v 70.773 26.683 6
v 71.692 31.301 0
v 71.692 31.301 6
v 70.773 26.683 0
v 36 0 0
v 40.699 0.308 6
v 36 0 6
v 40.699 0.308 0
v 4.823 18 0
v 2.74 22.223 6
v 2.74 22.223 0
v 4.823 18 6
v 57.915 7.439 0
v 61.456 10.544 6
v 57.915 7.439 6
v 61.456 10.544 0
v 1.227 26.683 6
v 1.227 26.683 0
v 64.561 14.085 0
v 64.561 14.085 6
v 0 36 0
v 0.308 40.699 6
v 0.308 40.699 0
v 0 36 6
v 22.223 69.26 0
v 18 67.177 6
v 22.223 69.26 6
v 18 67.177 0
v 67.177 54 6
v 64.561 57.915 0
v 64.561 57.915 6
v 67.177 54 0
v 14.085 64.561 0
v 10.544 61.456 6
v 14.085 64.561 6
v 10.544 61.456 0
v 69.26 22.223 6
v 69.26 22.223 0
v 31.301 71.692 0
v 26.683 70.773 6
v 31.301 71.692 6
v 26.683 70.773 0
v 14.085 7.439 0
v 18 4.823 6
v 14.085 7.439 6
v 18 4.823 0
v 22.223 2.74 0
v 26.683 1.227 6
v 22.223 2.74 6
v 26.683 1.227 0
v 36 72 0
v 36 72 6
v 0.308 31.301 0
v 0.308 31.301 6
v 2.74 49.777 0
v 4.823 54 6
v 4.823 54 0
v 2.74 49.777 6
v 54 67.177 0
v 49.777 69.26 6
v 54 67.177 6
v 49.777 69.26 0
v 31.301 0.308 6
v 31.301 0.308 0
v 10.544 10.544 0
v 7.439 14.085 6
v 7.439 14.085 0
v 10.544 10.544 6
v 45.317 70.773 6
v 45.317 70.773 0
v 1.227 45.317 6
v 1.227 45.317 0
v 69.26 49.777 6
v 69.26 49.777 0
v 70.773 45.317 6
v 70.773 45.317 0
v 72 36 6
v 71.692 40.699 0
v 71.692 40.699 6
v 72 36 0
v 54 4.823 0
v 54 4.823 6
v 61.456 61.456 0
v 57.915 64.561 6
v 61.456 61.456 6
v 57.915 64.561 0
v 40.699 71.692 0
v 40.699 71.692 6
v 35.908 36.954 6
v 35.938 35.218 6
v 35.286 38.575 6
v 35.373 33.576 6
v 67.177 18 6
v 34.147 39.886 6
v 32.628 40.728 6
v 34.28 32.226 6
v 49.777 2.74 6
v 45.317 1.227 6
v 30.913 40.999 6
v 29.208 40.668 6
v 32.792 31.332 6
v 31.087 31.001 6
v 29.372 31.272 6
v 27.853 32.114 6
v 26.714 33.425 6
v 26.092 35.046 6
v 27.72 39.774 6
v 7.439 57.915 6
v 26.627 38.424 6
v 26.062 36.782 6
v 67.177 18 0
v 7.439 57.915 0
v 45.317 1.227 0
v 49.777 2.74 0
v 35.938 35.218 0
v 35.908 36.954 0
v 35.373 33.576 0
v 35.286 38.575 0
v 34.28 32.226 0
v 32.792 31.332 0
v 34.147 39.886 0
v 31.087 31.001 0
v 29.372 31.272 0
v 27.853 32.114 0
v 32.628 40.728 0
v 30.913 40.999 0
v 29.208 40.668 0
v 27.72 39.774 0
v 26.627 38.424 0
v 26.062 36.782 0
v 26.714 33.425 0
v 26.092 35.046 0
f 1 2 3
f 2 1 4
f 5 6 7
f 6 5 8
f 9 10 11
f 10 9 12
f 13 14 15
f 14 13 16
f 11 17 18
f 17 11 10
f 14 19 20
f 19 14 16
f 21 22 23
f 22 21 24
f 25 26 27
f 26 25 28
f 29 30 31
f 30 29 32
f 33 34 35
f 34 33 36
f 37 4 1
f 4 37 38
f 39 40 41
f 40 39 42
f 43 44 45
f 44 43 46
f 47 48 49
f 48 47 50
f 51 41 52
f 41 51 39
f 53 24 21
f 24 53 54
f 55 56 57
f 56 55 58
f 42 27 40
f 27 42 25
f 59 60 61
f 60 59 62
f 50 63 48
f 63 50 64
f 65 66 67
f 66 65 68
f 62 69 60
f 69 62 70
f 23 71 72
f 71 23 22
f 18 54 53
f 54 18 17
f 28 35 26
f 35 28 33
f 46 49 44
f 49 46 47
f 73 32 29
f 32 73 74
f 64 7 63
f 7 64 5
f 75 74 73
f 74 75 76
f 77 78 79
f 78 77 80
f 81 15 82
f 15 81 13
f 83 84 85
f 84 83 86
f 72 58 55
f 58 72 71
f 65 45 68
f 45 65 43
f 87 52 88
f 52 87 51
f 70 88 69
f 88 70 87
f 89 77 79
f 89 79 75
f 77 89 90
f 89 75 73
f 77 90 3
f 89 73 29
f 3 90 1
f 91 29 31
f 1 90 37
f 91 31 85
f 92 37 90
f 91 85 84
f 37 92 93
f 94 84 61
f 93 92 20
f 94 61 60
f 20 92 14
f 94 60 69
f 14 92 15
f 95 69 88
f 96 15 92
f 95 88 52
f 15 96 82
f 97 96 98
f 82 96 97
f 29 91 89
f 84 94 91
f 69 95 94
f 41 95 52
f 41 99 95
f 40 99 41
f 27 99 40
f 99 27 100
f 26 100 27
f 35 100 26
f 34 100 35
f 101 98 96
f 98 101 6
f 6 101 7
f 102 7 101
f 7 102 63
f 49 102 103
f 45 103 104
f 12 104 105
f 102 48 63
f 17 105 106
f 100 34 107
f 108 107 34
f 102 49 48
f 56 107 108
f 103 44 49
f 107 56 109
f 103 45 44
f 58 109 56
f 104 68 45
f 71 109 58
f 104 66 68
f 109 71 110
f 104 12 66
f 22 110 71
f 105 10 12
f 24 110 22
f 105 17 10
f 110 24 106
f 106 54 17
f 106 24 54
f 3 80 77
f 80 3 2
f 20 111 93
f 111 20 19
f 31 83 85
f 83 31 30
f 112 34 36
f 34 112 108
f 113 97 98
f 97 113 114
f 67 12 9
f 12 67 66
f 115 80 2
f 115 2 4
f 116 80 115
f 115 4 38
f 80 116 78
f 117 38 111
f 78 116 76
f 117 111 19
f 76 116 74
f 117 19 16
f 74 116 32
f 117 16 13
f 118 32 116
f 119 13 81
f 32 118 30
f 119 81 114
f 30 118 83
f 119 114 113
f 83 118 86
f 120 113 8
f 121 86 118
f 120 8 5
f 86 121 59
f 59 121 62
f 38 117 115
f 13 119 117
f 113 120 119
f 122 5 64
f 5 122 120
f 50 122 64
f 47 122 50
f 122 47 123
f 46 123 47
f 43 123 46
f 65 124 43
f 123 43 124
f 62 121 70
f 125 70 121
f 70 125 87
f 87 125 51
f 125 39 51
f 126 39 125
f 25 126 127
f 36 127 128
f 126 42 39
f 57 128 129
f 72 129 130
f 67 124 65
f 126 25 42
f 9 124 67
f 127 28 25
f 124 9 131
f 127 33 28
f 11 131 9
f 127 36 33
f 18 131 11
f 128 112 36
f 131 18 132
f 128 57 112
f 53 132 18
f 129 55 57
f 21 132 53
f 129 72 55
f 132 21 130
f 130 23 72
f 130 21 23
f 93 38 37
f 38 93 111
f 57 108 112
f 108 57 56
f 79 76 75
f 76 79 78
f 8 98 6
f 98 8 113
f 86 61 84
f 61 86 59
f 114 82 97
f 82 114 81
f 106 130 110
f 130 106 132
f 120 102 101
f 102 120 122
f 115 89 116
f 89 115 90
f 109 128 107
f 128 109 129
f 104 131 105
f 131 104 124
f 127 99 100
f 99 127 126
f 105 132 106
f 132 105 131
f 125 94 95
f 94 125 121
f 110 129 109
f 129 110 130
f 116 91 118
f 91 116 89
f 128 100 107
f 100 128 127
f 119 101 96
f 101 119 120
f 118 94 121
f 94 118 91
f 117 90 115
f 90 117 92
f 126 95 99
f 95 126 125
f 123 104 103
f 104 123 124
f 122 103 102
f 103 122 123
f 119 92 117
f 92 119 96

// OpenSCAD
$fn = 32;

// ----------------------------------------------------------------------
// Cam plate: eccentric cam, base R36
// ----------------------------------------------------------------------

// --- parameters (mm) ---
base_r = 36;              // base circle radius
lobe_h = 12;              // cam lobe rise
bore_r = 5;               // shaft bore radius
plate_t = 6;              // plate thickness, Z (extrusion height)
ecc = 5;                  // disc eccentricity

profile = [[72, 36], [71.692, 40.699], [70.773, 45.317], [69.26, 49.777], [67.177, 54], [64.561, 57.915], [61.456, 61.456], [57.915, 64.561], [54, 67.177], [49.777, 69.26], [45.317, 70.773], [40.699, 71.692], [36, 72], [31.301, 71.692], [26.683, 70.773], [22.223, 69.26], [18, 67.177], [14.085, 64.561], [10.544, 61.456], [7.439, 57.915], [4.823, 54], [2.74, 49.777], [1.227, 45.317], [0.308, 40.699], [0, 36], [0.308, 31.301], [1.227, 26.683], [2.74, 22.223], [4.823, 18], [7.439, 14.085], [10.544, 10.544], [14.085, 7.439], [18, 4.823], [22.223, 2.74], [26.683, 1.227], [31.301, 0.308], [36, 0], [40.699, 0.308], [45.317, 1.227], [49.777, 2.74], [54, 4.823], [57.915, 7.439], [61.456, 10.544], [64.561, 14.085], [67.177, 18], [69.26, 22.223], [70.773, 26.683], [71.692, 31.301]];  // primary outline, 48 points, counter clockwise
void_1 = [[35.908, 36.954], [35.286, 38.575], [34.147, 39.886], [32.628, 40.728], [30.913, 40.999], [29.208, 40.668], [27.72, 39.774], [26.627, 38.424], [26.062, 36.782], [26.092, 35.046], [26.714, 33.425], [27.853, 32.114], [29.372, 31.272], [31.087, 31.001], [32.792, 31.332], [34.28, 32.226], [35.373, 33.576], [35.938, 35.218]];  // shaft bore, 18 points

// --- the one profile operation ---
difference() {
  linear_extrude(height = plate_t) polygon(points = profile);
  translate([0, 0, -1])
    linear_extrude(height = plate_t + 2) polygon(points = void_1);
}
